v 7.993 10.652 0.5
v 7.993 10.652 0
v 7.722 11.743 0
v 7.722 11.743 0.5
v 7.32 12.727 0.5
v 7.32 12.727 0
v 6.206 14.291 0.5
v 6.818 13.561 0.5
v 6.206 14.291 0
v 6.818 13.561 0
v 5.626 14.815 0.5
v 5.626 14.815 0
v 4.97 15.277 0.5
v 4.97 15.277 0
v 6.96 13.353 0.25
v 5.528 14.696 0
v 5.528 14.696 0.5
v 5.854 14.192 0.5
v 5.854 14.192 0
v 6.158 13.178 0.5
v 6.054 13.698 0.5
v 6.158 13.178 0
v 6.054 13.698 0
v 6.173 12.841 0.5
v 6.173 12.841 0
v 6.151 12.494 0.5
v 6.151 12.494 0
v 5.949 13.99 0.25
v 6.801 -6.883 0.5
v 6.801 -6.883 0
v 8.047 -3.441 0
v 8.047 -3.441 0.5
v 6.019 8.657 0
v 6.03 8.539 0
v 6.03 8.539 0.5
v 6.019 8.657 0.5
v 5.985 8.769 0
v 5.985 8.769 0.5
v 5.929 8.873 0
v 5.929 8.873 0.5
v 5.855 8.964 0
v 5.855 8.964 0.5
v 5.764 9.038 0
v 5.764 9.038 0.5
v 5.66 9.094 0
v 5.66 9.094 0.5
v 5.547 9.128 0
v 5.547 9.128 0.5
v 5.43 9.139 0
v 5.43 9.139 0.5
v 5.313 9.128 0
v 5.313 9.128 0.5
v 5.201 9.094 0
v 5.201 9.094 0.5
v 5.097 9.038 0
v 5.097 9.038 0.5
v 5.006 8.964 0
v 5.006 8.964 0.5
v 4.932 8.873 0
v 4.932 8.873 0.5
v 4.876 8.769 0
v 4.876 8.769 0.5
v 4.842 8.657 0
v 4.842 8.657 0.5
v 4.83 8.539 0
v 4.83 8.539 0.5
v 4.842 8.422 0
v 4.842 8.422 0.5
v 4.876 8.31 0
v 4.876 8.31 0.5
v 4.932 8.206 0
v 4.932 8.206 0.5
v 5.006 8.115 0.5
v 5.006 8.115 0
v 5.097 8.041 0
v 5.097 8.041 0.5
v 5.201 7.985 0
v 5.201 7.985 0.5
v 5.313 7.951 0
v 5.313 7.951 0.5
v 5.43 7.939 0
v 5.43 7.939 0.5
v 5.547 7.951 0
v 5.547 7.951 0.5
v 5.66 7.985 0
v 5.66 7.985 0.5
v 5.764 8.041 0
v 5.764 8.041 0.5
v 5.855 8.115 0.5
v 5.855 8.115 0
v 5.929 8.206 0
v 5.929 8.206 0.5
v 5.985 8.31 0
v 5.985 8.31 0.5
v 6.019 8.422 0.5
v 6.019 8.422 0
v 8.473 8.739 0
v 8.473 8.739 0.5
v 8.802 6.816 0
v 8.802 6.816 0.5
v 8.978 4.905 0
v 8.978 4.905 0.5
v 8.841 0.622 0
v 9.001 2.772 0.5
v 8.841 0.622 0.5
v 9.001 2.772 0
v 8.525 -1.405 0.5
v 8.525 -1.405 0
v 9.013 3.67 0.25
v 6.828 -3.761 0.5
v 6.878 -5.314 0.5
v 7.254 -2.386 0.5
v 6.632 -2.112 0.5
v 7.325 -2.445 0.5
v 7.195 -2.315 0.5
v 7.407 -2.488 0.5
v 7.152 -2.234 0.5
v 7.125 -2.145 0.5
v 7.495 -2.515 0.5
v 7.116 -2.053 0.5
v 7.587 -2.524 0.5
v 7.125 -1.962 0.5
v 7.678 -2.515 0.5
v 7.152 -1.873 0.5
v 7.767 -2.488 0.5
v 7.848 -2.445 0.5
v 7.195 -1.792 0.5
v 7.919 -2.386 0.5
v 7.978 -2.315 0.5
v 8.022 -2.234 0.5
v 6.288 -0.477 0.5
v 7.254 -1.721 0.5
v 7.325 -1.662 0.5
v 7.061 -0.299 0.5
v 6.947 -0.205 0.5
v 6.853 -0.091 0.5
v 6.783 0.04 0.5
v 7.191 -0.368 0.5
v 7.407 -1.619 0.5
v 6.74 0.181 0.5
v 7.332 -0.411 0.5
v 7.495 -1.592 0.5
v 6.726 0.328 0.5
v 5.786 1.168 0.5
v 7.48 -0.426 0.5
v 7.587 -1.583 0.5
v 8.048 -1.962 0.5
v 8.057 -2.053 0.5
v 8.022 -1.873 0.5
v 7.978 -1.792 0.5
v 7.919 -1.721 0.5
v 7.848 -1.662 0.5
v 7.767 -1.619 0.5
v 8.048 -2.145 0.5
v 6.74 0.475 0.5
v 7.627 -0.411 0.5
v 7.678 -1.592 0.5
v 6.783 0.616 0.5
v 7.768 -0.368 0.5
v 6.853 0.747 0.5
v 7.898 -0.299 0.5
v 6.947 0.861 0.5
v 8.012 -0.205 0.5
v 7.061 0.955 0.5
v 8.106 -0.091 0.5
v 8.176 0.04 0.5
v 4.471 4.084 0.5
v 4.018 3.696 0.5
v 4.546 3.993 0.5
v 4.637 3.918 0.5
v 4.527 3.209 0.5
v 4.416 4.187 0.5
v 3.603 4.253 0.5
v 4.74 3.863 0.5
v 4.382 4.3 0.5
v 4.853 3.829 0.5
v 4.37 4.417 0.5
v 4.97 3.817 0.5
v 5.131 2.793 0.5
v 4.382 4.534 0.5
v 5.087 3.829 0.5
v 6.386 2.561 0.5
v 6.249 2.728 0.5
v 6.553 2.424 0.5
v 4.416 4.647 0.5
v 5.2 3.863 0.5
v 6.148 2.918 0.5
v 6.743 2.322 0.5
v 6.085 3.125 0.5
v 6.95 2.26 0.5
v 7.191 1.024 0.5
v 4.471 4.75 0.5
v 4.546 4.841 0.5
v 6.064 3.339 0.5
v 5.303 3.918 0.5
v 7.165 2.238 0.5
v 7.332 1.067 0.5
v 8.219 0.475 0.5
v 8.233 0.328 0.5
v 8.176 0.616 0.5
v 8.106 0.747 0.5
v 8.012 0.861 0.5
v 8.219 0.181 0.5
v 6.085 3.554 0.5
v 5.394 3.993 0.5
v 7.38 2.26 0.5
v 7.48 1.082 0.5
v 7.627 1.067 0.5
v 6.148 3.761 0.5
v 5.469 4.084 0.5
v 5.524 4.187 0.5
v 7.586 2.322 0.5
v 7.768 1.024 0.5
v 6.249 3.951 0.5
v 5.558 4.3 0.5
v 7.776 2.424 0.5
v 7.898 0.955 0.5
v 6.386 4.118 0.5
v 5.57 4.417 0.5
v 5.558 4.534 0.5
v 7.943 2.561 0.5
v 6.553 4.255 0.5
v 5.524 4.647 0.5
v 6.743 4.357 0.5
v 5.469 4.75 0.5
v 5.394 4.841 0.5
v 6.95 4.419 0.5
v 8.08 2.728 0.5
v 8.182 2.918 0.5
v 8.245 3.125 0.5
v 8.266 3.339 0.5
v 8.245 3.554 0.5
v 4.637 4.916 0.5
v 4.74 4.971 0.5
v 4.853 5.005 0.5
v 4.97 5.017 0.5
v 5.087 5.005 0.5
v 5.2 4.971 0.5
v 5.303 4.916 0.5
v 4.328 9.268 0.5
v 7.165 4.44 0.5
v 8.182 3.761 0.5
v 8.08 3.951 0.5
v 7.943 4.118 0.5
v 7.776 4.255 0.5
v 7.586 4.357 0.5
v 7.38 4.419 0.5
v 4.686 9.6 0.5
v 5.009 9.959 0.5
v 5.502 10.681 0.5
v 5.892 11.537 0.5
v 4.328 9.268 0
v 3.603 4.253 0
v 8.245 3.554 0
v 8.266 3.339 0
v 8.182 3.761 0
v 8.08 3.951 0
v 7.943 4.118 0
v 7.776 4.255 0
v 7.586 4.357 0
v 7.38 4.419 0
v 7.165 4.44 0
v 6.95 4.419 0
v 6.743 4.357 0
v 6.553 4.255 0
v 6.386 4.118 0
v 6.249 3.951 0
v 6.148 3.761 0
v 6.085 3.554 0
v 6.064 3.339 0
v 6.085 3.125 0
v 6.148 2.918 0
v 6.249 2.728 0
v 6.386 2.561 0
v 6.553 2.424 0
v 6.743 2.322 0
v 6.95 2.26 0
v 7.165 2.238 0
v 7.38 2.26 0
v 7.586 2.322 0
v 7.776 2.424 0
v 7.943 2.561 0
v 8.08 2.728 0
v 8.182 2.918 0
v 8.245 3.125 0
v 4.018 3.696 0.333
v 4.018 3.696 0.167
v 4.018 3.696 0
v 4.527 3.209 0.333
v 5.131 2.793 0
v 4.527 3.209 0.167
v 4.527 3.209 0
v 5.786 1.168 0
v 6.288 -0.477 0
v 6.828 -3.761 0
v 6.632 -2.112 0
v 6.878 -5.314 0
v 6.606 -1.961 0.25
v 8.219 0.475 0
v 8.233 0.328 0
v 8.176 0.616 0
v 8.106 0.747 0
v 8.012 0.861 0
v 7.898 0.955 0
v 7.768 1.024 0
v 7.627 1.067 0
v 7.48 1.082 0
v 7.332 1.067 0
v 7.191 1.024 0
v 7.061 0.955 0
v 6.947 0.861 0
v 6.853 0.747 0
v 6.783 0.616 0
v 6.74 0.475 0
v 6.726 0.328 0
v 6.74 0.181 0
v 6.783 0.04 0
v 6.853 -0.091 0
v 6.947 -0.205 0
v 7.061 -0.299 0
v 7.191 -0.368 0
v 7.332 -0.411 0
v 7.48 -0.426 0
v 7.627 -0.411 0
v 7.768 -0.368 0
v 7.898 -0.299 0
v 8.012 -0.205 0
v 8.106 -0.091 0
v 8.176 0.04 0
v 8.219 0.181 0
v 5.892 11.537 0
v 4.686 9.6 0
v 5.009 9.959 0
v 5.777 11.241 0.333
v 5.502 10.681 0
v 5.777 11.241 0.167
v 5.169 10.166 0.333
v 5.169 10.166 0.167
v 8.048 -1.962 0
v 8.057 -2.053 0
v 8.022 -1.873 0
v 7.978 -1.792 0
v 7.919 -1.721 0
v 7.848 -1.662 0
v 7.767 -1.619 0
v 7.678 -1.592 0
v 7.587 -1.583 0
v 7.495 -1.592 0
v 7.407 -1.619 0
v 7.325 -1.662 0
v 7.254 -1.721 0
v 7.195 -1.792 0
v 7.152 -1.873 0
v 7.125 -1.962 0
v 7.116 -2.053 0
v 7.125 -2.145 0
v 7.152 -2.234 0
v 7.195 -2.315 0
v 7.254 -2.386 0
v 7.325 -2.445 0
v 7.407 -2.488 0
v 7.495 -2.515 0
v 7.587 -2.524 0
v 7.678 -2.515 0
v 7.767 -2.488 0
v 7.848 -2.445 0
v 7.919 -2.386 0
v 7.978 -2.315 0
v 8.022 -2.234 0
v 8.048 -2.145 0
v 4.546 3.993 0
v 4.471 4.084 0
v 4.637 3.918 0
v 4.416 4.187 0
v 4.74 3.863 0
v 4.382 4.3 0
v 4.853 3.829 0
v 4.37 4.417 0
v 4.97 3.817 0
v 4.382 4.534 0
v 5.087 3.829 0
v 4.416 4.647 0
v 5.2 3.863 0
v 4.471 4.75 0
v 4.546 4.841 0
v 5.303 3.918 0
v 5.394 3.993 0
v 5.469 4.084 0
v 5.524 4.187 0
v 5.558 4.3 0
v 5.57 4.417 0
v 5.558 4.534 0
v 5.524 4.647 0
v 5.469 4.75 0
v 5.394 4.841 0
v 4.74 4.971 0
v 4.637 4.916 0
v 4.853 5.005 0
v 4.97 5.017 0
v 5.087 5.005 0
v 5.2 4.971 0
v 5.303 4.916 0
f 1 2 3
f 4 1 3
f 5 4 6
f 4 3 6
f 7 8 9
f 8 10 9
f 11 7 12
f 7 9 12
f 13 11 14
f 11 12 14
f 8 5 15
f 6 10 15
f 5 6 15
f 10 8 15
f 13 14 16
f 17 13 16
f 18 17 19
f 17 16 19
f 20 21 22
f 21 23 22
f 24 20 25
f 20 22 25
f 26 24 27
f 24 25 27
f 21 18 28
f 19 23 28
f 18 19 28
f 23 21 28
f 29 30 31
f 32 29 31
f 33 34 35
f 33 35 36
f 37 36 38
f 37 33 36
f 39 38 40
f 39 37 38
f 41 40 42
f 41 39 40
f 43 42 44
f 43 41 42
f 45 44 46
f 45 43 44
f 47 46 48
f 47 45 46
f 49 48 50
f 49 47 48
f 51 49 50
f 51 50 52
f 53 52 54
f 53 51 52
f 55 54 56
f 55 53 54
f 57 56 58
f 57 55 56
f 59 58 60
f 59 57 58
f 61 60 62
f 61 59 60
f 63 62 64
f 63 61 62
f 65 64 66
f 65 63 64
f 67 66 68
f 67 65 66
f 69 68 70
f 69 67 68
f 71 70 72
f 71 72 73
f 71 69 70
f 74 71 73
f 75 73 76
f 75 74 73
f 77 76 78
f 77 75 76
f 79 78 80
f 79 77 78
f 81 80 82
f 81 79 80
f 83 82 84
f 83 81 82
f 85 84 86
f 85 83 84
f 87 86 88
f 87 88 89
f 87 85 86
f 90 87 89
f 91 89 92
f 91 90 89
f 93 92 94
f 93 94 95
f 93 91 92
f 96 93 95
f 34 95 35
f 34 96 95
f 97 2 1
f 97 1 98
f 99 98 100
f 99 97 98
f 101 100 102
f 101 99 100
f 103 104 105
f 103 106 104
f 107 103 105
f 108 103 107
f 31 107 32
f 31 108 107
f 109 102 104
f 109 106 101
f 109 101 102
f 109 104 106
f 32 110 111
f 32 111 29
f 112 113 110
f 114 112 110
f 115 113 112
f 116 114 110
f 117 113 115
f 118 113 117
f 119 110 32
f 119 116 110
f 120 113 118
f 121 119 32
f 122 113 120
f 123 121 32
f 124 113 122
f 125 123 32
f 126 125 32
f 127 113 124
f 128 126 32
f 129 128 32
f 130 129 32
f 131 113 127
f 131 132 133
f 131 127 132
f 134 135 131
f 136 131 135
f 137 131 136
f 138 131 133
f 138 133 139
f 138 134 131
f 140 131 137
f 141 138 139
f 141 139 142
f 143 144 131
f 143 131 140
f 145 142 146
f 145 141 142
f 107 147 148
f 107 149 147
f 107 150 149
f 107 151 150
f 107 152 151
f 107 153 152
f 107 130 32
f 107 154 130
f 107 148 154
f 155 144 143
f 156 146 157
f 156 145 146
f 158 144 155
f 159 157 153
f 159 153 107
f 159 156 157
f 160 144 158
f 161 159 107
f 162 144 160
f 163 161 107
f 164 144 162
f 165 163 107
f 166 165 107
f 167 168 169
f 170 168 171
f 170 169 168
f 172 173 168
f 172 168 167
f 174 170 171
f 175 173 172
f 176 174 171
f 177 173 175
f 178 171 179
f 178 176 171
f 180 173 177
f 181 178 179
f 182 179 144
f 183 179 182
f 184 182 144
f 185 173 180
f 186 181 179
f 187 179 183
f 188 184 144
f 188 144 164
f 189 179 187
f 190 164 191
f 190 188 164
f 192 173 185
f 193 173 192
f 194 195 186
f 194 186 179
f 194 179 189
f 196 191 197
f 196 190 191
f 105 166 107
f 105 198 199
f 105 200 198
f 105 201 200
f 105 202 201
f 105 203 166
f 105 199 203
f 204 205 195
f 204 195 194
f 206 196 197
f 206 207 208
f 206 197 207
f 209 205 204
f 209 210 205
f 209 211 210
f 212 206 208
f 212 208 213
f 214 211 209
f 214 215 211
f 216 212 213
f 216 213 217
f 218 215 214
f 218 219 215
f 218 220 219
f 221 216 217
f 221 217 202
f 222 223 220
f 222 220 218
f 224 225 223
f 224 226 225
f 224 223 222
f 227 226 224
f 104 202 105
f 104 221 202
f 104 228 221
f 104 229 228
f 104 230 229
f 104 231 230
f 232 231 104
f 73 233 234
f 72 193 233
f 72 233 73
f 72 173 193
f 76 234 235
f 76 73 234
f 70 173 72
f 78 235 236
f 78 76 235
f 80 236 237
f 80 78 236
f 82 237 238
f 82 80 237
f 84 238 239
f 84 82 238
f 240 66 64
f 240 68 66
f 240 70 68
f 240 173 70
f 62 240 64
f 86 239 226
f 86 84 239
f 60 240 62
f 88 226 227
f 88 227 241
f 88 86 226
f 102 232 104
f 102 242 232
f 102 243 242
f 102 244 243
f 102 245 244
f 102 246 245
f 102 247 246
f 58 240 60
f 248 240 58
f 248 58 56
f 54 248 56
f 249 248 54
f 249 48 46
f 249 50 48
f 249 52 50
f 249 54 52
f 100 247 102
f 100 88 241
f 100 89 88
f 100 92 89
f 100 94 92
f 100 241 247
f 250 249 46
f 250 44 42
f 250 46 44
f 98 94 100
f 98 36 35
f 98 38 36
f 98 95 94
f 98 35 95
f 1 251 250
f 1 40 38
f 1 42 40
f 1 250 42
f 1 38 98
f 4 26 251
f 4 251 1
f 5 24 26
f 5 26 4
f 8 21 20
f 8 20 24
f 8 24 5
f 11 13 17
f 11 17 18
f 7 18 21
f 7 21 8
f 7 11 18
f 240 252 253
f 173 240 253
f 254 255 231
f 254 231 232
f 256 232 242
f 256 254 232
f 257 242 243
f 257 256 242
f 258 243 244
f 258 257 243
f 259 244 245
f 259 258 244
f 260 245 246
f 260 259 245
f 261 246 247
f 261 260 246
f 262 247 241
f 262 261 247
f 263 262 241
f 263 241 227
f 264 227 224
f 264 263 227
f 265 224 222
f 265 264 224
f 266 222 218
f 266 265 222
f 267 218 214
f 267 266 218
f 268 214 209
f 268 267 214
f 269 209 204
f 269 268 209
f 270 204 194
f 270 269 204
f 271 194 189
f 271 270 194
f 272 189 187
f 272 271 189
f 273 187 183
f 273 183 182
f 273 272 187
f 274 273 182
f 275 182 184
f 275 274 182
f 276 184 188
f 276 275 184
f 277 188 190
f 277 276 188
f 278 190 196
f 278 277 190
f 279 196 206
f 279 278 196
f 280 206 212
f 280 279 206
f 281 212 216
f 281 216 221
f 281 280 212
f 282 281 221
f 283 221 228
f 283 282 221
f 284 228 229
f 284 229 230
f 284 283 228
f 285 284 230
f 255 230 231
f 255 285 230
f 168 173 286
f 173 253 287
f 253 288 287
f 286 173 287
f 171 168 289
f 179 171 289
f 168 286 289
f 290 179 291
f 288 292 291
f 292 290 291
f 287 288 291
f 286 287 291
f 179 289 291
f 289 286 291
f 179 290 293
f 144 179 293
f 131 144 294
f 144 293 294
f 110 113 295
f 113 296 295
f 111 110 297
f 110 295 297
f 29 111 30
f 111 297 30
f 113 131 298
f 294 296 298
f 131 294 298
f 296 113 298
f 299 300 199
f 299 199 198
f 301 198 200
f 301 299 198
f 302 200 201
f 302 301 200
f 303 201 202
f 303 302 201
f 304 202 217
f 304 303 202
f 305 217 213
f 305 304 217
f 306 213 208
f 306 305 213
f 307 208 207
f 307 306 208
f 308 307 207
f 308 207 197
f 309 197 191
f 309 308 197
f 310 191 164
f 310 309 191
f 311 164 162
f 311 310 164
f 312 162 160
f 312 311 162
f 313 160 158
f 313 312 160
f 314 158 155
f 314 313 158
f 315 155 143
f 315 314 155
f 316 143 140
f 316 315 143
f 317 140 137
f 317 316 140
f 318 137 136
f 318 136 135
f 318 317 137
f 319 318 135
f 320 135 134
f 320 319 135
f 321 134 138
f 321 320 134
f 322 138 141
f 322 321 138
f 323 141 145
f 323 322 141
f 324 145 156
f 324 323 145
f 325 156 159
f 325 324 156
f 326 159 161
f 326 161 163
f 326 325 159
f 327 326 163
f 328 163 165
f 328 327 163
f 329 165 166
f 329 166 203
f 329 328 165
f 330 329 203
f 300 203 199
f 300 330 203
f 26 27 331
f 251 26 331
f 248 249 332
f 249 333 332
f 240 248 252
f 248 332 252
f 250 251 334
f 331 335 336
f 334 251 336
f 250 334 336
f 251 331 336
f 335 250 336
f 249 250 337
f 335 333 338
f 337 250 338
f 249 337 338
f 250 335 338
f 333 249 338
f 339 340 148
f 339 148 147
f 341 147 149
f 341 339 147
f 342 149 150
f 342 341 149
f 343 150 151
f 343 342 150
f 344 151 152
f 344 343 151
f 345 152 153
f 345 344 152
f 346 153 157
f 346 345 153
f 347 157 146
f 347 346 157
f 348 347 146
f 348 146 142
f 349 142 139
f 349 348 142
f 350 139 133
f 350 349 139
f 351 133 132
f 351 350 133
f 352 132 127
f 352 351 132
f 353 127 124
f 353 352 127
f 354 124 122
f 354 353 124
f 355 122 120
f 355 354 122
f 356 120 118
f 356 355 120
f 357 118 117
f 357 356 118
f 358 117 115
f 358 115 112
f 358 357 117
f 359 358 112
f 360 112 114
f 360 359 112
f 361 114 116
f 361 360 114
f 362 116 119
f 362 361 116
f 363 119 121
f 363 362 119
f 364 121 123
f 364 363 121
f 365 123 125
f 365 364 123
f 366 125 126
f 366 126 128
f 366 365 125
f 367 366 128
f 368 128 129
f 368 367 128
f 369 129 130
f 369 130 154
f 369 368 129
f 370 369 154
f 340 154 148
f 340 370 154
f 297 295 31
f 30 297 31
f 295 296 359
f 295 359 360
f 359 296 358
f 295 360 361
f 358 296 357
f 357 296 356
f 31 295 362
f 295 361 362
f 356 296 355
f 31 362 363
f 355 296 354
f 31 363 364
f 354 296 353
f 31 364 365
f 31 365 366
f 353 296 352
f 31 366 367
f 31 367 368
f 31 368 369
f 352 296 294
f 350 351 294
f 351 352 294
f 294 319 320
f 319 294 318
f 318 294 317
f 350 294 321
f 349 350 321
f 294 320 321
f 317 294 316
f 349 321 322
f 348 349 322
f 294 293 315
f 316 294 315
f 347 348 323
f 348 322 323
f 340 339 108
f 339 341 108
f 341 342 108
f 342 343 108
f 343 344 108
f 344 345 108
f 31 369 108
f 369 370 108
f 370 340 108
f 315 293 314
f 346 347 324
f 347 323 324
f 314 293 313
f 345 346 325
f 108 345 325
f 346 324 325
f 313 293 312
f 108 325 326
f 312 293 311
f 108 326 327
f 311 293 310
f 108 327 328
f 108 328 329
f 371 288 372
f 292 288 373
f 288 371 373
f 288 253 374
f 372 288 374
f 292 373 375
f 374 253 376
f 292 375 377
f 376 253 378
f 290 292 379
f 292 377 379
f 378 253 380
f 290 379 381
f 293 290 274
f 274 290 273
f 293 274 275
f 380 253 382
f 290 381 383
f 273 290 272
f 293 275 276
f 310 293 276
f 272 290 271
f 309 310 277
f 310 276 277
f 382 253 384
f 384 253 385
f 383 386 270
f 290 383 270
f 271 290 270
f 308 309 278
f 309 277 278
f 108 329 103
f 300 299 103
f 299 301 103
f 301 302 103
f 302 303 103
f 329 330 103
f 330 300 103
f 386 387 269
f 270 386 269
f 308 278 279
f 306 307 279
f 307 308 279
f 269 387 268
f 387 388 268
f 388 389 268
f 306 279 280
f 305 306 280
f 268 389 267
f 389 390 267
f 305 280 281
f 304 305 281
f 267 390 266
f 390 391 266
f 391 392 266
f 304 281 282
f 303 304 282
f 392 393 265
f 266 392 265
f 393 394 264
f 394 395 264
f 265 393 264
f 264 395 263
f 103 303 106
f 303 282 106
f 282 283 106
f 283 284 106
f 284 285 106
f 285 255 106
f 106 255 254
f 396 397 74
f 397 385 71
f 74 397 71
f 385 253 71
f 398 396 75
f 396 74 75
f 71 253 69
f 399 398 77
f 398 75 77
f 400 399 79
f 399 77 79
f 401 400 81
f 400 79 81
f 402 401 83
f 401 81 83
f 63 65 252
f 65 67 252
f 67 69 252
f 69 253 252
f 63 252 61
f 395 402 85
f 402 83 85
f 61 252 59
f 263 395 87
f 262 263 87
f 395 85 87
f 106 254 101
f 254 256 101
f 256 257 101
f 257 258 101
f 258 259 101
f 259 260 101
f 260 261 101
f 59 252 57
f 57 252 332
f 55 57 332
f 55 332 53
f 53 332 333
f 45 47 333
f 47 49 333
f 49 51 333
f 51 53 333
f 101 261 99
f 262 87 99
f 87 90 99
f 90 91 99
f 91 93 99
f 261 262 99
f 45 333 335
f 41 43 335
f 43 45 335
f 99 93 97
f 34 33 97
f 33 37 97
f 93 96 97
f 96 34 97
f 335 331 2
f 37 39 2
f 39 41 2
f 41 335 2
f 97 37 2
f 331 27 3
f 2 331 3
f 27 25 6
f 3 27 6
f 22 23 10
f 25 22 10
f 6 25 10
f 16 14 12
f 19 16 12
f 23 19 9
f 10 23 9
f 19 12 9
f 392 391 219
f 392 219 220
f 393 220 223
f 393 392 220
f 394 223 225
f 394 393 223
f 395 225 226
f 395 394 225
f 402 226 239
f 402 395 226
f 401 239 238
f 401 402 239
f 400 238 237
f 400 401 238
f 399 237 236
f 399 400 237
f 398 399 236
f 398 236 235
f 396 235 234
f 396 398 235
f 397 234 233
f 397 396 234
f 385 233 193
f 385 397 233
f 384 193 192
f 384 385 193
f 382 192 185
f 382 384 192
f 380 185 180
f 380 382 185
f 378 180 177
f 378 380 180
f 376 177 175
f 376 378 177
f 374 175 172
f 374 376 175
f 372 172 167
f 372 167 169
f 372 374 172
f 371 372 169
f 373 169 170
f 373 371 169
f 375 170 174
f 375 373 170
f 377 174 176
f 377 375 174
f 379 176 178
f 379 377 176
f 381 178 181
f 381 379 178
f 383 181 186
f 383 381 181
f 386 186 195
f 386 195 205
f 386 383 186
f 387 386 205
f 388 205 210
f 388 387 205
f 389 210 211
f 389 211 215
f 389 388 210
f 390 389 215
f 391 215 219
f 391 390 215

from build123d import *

# Parameters (mm, degrees)
ESQUISSE1_R        = 1.101038198
ESQUISSE1_R_2      = 0.6
ESQUISSE1_R_3      = 0.753706931
ESQUISSE1_R_4      = 0.470708968
BOSS_EXTRU_1_DEPTH = 0.5


with BuildPart() as part:
    # Esquisse1 → Boss.-Extru.1 (new body)
    with BuildSketch(Plane.XY):
        with BuildLine():
            Line((4.327755202, 9.268221518), (3.603132185, 4.253126908))
            add(Edge.make_bspline(
                [(3.603132185, 4.253126908), (3.97023948, 3.660792989), (4.479491264, 3.174109207), (5.130887536, 2.793075563)],
                knots=[0.419081869, 0.419081869, 0.419081869, 0.419081869, 1, 1, 1, 1], degree=3))
            add(Edge.make_bspline(
                [(5.130887536, 2.793075563), (7.24661574, -1.876356548), (6.801291284, -6.882931027)],
                knots=[0, 0, 0, 1, 1, 1], degree=2))
            Line((6.801291284, -6.882931027), (8.047479128, -3.441465514))
            add(Edge.make_bspline(
                [(7.993289874, 10.651808238), (10.006516758, 3.73495856), (8.047479128, -3.441465514)],
                knots=[0, 0, 0, 1, 1, 1], degree=2))
            add(Edge.make_bspline(
                [(7.993289874, 10.651808238), (7.437530526, 13.742255062), (4.969978084, 15.276811926)],
                knots=[0, 0, 0, 1, 1, 1], degree=2))
            add(Edge.make_bspline(
                [(4.969978084, 15.276811926), (6.336855169, 14.093829897), (6.151102735, 12.493995378)],
                knots=[0, 0, 0, 1, 1, 1], degree=2))
            add(Edge.make_bspline(
                [(6.151102735, 12.493995378), (5.8933943, 11.152214383), (5.285611789, 10.07695643), (4.327755202, 9.268221518)],
                knots=[0, 0, 0, 0, 0.717084893, 0.717084893, 0.717084893, 0.717084893], degree=3))
        make_face()
        with Locations((7.16473136, 3.33945502)):
            Circle(ESQUISSE1_R, mode=Mode.SUBTRACT)
        with Locations((5.43038475, 8.539470271)):
            Circle(ESQUISSE1_R_2, mode=Mode.SUBTRACT)
        with Locations((7.47952091, 0.328032682)):
            Circle(ESQUISSE1_R_3, mode=Mode.SUBTRACT)
        with Locations((7.586653272, -2.053387377)):
            Circle(ESQUISSE1_R_4, mode=Mode.SUBTRACT)
        with Locations((4.969978084, 4.416971754)):
            Circle(ESQUISSE1_R_2, mode=Mode.SUBTRACT)
    extrude(amount=BOSS_EXTRU_1_DEPTH)


solid = part.part
